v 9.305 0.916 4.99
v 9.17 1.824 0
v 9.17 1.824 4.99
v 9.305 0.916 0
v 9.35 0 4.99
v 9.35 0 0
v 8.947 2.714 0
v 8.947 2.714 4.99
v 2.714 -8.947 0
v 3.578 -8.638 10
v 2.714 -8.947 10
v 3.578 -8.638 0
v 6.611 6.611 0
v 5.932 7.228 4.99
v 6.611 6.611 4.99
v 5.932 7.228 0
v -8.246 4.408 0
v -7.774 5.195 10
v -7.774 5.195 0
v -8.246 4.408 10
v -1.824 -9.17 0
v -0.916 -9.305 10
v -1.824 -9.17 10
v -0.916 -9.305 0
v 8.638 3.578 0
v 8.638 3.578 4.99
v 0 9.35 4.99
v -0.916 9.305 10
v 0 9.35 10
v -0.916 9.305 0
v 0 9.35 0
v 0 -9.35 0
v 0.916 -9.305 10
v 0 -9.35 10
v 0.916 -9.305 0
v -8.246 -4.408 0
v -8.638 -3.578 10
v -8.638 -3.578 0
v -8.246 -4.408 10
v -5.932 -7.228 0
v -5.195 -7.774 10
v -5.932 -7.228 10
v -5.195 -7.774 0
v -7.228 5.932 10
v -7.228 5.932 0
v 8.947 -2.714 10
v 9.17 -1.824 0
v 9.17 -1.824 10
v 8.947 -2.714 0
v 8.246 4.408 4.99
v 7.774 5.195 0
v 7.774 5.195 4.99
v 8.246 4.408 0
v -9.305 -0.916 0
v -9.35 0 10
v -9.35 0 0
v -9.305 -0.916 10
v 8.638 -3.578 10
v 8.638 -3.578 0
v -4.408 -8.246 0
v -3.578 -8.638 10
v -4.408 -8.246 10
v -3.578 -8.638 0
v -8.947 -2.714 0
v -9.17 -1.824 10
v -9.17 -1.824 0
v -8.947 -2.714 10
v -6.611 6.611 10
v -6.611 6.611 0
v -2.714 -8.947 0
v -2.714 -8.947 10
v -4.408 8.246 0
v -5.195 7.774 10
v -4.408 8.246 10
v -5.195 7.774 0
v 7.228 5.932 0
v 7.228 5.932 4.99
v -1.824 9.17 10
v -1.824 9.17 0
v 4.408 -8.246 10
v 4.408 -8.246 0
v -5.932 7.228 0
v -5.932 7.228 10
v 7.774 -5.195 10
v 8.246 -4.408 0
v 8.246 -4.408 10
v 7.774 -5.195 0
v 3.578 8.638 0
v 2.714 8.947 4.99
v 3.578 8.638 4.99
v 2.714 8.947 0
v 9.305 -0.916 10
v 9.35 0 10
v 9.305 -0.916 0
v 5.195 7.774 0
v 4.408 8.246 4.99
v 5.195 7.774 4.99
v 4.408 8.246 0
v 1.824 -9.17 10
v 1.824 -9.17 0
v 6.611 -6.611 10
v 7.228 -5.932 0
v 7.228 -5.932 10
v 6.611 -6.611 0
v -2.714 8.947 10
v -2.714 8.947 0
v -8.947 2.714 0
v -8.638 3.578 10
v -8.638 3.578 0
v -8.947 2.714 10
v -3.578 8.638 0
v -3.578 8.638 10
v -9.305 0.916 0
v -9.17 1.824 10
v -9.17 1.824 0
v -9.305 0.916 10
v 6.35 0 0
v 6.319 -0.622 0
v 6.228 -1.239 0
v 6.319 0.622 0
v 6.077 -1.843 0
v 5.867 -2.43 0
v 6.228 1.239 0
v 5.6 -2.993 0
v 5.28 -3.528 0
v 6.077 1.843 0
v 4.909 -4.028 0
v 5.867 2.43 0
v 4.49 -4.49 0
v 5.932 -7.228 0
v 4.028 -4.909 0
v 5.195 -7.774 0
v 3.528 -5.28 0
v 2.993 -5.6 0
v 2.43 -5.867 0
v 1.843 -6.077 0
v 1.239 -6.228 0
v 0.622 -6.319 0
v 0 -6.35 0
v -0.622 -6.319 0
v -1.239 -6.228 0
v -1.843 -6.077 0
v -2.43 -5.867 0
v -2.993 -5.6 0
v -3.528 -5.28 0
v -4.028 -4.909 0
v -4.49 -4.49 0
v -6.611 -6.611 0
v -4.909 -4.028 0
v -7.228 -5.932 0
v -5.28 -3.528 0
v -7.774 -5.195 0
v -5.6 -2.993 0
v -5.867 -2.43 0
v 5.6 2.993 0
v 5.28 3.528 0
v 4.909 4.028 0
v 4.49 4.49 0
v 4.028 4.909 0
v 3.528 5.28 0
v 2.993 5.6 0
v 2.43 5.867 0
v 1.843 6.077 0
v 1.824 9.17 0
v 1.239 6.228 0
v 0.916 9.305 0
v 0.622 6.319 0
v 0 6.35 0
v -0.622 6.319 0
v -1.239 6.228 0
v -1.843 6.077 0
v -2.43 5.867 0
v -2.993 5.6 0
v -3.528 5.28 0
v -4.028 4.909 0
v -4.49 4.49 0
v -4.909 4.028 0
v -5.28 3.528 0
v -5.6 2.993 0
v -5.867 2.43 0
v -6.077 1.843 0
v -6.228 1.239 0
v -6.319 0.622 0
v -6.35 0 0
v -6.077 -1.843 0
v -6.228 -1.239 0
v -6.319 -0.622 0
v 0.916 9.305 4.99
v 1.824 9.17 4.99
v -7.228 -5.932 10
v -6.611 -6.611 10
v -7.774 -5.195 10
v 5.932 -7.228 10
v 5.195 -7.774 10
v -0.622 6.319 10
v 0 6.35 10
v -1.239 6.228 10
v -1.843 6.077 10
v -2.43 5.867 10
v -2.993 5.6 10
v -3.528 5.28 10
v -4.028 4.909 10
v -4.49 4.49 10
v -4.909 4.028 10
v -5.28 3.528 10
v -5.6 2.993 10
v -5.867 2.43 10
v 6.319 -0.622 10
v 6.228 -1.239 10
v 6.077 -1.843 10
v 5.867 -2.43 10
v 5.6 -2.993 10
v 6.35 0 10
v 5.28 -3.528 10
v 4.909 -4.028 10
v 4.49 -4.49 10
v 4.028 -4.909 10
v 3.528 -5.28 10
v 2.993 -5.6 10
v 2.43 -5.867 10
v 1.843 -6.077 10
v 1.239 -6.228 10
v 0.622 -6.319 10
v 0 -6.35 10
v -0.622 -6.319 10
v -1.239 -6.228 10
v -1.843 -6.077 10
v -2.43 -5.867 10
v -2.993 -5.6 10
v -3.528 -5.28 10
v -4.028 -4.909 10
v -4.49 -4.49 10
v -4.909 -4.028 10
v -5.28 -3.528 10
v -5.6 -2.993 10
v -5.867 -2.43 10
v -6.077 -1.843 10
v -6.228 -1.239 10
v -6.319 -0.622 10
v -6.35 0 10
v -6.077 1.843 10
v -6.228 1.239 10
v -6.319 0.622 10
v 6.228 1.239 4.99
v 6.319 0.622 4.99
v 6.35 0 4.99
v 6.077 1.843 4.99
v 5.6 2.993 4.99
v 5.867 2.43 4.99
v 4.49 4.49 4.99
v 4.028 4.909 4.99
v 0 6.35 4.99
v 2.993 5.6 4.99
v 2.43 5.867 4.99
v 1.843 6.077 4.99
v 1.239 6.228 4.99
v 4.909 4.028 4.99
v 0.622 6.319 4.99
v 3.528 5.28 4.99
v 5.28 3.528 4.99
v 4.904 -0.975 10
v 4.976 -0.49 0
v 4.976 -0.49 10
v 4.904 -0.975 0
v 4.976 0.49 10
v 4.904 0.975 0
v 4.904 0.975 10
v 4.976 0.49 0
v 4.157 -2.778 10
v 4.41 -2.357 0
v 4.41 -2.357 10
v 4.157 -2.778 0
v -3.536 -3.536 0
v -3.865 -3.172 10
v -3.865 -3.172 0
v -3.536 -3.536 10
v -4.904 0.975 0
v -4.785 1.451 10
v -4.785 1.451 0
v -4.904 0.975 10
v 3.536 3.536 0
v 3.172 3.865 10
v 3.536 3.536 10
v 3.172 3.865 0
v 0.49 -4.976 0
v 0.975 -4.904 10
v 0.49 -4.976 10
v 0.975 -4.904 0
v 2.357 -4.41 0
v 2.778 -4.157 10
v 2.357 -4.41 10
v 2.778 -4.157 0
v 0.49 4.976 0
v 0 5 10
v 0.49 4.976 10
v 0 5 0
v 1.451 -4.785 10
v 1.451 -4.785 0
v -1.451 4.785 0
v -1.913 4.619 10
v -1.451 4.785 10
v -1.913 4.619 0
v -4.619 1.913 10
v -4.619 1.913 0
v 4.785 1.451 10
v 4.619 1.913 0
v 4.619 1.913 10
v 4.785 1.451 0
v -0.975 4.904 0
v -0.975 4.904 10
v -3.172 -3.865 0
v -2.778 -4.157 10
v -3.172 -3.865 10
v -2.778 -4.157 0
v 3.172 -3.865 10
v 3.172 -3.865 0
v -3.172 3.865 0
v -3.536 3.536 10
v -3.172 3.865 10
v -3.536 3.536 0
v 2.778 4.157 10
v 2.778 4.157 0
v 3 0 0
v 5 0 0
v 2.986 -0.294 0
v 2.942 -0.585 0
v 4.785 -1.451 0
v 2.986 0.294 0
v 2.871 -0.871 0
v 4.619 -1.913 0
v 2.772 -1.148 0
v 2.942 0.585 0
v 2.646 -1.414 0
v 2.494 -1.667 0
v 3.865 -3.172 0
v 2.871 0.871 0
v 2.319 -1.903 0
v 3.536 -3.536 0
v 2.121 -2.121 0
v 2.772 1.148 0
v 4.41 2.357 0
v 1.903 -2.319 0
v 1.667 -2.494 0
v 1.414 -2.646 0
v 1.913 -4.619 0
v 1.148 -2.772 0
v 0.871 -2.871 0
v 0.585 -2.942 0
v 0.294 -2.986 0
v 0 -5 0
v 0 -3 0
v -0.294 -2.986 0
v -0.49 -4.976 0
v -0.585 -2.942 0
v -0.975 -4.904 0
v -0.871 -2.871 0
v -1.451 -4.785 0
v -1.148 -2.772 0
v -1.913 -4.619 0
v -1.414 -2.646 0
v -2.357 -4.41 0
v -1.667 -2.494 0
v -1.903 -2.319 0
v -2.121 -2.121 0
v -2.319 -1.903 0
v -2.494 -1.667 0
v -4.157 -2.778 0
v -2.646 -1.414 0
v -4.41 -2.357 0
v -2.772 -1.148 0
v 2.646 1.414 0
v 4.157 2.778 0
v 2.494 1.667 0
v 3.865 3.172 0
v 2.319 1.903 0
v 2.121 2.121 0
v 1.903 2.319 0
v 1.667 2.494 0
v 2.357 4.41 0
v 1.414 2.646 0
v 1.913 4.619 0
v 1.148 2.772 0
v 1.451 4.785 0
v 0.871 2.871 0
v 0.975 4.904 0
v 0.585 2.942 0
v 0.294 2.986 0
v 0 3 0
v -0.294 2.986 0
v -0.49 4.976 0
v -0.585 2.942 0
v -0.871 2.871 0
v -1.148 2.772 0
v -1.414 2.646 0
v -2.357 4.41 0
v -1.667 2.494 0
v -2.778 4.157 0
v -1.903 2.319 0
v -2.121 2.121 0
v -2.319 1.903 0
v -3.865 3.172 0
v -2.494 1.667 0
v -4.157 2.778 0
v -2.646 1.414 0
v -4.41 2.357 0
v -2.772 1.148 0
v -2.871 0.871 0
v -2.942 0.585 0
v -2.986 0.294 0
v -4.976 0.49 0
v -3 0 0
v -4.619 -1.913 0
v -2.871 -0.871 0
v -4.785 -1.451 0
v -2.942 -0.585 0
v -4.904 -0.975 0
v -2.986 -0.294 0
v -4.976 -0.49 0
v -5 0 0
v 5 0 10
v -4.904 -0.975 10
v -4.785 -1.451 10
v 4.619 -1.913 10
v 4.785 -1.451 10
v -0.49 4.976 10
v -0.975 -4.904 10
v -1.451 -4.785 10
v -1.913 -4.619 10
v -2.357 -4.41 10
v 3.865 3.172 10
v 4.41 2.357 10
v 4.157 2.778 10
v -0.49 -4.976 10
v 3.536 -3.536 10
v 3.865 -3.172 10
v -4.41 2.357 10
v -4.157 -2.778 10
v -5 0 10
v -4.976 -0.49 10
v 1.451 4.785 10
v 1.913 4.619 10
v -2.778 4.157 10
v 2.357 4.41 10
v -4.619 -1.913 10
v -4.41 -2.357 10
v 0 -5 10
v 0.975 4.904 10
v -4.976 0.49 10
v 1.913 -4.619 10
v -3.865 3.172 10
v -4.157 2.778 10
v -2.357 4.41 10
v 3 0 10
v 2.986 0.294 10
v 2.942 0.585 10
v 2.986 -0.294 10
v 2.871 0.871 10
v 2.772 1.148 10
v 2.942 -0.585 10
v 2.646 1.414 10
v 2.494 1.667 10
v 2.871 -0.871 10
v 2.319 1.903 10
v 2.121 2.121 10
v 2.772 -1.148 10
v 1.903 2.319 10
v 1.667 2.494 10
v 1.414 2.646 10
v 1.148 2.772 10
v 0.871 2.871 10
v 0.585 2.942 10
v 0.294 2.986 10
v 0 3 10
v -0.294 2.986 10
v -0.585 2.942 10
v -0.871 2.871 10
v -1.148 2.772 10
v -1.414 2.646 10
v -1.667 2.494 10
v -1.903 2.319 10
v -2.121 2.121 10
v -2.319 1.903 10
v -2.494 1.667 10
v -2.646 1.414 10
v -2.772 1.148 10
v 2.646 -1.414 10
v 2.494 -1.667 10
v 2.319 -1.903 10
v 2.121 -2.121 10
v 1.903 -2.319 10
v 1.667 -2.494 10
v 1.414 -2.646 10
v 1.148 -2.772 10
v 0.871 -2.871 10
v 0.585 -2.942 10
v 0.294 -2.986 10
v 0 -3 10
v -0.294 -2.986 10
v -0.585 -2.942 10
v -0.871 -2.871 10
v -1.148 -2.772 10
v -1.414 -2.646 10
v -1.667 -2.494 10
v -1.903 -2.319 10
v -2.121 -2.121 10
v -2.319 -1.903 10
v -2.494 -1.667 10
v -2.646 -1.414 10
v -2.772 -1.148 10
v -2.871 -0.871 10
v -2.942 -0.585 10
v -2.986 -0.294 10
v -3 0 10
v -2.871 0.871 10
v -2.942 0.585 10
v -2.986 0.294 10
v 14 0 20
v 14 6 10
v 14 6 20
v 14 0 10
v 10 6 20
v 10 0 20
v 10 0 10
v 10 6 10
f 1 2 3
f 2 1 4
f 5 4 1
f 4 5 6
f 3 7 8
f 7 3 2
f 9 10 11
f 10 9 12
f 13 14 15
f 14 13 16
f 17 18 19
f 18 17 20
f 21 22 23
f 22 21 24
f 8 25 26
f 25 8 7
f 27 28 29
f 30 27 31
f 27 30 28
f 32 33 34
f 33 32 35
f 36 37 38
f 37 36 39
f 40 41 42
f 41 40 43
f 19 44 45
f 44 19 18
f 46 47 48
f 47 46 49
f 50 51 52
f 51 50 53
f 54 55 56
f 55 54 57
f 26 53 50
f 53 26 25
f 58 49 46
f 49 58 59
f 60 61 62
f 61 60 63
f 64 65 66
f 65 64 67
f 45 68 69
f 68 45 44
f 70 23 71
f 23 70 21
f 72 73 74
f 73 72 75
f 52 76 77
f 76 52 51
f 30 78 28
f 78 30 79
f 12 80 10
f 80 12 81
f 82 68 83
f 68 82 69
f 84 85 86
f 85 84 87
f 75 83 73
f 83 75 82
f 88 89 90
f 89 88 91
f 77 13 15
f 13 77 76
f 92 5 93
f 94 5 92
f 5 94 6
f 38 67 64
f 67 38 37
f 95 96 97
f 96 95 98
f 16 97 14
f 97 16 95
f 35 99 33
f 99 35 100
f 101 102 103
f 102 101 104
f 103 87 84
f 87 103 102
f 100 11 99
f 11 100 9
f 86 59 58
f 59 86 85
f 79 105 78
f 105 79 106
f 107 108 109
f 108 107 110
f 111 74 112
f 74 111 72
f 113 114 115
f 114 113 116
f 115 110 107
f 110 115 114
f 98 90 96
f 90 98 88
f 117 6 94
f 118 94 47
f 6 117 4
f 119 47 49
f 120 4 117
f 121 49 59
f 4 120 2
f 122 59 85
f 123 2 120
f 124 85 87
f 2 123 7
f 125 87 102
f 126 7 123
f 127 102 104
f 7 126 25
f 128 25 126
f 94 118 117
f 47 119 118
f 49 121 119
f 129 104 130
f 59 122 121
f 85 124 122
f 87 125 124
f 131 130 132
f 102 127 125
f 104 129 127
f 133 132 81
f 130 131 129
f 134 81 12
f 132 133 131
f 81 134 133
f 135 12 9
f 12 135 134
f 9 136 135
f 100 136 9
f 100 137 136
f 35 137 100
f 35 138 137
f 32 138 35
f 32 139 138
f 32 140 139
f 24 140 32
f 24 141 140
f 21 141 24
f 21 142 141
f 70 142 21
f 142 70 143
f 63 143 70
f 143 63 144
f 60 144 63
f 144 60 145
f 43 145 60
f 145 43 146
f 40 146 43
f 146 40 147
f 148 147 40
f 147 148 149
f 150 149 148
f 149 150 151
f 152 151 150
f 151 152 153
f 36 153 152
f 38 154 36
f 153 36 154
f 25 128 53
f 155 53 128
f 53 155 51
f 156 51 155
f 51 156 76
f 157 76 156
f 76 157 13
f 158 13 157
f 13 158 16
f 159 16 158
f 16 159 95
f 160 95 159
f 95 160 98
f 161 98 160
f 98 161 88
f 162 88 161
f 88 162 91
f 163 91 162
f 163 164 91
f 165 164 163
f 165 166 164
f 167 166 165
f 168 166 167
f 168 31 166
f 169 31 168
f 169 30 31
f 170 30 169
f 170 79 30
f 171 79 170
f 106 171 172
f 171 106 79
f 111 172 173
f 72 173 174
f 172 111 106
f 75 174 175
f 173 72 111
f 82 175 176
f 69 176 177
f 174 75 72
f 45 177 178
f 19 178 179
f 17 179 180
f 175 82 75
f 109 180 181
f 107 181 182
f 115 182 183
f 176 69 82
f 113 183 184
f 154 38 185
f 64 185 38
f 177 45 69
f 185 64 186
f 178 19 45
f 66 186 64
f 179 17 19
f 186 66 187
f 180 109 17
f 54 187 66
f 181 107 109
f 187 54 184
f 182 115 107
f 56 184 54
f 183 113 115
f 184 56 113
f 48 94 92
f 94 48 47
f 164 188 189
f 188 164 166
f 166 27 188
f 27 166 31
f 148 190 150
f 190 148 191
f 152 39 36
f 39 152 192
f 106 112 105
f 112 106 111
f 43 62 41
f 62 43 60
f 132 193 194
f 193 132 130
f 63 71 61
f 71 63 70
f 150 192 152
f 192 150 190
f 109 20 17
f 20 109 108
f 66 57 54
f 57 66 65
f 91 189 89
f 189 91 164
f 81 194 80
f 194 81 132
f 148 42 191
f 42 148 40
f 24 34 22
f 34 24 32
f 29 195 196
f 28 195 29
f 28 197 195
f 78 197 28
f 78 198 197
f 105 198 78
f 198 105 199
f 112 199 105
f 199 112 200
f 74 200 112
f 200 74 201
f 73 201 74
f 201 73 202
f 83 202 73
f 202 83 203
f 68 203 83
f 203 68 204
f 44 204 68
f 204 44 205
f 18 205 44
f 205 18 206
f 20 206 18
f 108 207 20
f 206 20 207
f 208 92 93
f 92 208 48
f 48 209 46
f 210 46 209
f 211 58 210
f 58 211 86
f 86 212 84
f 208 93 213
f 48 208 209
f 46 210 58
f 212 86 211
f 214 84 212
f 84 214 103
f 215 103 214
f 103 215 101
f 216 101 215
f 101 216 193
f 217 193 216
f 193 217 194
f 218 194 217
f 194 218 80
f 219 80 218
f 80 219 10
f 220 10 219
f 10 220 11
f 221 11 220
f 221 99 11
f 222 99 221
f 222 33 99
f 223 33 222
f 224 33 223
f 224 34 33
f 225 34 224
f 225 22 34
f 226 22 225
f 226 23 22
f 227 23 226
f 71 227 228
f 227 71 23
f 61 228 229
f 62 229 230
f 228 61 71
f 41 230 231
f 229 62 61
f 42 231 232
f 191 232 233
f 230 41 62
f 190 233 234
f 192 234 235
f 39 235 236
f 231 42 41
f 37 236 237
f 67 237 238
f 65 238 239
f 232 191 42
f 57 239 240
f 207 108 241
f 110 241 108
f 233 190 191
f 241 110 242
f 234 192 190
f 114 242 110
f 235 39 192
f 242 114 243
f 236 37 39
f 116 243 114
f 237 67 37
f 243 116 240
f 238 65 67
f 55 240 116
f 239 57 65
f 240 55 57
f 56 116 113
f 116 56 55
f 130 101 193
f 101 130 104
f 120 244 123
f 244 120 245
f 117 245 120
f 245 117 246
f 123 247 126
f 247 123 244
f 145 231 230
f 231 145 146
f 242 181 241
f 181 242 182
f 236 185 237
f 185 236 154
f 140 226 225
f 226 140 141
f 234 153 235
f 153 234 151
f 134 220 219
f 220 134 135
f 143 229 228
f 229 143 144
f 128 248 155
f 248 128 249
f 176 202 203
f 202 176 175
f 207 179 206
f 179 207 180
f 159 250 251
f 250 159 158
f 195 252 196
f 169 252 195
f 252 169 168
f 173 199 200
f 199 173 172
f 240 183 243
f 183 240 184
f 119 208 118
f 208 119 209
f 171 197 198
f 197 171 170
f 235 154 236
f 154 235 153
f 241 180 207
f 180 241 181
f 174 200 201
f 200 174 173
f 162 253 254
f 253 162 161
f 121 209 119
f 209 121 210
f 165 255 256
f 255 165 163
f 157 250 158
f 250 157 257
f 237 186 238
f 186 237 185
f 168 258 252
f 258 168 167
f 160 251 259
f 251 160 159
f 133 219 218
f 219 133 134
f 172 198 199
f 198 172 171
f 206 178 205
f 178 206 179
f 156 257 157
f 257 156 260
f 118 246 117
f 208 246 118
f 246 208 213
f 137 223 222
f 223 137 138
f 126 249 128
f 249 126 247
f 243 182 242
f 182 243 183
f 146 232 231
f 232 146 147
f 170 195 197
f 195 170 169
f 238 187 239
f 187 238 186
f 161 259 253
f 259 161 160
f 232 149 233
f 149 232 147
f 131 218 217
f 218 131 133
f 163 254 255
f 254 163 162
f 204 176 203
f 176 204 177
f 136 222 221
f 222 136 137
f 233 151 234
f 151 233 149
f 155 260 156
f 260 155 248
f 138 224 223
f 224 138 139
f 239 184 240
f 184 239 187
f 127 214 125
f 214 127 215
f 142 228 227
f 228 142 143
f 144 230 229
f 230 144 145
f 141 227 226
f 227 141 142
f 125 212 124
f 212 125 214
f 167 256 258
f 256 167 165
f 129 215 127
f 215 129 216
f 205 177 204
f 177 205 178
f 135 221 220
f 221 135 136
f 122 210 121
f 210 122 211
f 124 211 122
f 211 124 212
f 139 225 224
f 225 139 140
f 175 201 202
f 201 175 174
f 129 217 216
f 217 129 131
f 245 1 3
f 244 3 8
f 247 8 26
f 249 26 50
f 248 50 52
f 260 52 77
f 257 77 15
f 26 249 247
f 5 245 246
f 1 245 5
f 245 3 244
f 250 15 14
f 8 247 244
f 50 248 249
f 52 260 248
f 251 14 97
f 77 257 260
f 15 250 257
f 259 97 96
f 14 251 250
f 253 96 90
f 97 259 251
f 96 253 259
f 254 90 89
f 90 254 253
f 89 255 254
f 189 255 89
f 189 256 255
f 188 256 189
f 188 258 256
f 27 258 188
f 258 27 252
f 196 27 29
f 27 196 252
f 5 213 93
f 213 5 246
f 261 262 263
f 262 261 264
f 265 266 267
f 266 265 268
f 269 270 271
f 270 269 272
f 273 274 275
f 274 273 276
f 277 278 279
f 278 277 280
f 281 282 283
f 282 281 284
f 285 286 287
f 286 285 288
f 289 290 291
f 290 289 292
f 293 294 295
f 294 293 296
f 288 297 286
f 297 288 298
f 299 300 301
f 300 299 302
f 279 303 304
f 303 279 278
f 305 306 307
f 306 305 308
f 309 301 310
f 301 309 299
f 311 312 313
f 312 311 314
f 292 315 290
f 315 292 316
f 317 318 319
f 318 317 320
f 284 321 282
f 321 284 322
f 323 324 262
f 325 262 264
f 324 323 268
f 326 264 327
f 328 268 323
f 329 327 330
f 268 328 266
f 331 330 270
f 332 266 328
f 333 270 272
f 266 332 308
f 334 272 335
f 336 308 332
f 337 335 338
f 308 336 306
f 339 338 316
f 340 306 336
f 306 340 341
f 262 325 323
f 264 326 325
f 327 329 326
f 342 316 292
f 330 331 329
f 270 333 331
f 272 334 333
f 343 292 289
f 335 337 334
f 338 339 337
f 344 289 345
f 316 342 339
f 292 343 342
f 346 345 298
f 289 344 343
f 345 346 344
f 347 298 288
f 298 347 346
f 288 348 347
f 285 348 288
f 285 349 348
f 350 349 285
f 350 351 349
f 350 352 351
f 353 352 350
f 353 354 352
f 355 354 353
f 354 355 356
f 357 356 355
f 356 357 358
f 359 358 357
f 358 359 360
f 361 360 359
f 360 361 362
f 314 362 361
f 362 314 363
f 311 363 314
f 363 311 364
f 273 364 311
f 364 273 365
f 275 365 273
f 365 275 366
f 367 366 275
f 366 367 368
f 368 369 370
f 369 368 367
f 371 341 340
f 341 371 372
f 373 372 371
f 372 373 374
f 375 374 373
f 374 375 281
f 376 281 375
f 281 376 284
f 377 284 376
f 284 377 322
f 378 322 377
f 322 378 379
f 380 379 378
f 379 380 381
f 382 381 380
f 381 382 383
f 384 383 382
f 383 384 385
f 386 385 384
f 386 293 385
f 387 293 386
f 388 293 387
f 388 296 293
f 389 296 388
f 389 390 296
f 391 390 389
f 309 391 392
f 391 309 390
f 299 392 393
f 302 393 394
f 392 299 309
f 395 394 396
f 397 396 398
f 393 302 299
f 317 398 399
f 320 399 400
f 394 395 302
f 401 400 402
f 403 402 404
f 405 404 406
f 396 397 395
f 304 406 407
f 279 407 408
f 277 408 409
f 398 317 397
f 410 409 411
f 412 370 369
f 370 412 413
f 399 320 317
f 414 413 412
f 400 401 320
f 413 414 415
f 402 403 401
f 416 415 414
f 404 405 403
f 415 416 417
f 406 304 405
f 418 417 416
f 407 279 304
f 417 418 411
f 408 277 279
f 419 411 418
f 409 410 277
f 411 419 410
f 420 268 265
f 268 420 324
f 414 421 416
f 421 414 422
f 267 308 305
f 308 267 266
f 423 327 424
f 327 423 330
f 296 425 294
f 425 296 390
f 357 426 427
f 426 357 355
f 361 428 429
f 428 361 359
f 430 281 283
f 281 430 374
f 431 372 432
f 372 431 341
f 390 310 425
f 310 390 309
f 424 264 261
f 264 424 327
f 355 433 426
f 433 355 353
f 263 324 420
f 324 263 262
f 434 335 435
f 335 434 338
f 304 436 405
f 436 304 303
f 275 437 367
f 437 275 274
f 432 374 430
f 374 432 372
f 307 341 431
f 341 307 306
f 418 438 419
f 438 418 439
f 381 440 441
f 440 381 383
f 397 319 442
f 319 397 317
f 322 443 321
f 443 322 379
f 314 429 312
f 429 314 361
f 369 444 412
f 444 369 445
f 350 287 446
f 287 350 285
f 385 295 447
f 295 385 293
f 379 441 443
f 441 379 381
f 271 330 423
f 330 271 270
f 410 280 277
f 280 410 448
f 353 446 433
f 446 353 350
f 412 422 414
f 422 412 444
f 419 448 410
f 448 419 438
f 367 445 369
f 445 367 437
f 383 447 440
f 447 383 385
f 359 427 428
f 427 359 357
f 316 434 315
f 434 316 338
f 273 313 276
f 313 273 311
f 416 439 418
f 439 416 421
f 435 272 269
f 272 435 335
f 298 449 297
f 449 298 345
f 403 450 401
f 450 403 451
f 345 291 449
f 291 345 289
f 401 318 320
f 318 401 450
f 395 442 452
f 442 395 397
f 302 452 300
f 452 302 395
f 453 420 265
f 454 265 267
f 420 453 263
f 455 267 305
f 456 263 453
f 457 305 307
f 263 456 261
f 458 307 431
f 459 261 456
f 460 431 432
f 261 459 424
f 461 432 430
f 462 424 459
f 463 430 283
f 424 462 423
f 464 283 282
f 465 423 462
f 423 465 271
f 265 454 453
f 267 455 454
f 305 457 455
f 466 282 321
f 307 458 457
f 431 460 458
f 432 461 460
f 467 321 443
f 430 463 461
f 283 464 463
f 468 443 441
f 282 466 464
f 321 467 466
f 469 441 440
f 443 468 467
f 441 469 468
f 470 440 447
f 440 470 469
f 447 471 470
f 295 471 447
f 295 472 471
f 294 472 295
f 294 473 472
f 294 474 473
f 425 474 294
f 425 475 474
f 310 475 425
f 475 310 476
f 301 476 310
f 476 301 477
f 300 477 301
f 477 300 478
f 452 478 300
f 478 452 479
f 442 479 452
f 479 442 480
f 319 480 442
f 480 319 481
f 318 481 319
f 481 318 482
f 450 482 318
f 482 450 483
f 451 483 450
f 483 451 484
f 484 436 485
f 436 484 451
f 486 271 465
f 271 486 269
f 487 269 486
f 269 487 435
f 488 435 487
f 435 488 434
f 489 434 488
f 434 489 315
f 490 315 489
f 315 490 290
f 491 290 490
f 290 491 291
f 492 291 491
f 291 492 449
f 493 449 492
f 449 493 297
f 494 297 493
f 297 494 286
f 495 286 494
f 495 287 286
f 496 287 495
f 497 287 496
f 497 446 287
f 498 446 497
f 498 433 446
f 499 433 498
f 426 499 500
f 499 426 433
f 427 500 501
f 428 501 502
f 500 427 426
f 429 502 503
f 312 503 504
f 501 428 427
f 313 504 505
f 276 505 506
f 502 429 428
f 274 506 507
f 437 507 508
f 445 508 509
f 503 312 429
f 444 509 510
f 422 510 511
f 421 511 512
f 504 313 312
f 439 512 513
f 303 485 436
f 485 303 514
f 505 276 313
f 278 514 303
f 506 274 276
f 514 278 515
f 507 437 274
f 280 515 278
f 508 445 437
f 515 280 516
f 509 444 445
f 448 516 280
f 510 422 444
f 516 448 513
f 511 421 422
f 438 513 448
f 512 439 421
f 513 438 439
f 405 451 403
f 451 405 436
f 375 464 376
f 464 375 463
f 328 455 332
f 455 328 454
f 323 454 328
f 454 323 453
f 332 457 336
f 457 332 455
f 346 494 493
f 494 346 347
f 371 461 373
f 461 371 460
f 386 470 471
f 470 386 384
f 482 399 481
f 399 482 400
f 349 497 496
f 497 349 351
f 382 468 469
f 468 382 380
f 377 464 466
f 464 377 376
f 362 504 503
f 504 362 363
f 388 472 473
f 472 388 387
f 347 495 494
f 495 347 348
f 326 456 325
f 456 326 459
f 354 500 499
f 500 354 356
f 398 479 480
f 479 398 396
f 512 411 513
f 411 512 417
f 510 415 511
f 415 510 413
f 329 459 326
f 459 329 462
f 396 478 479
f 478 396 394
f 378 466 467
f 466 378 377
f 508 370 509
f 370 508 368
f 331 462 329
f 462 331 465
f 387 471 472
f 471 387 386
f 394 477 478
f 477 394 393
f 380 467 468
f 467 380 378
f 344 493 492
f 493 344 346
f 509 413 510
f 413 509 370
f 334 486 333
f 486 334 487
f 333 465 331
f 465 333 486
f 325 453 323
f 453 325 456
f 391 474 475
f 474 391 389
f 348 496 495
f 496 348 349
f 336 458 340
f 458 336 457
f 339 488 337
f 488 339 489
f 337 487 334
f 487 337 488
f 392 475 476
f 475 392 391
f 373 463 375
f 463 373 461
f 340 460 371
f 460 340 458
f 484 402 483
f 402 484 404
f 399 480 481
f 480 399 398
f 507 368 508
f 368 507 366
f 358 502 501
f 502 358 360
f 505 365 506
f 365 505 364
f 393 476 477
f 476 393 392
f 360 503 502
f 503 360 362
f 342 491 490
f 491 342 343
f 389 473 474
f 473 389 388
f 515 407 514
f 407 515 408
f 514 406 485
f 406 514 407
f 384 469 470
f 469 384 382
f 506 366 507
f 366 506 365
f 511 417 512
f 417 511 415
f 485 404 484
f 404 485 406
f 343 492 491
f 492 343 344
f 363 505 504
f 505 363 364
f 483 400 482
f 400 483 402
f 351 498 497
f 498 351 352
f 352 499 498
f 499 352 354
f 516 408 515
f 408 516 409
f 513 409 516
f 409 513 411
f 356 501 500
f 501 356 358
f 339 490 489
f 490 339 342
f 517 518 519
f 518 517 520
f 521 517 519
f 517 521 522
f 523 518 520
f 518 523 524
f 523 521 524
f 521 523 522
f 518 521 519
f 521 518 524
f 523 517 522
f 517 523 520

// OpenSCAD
$fn = 64;

// Dimensions
rod_diameter = 12.7;           // Inner diameter of rod ring
rod_wall = 3;                 // Wall thickness of rod ring
rod_outer_diameter = rod_diameter + 2 * rod_wall;  // 18.7 mm

tubing_inner_diameter = 6;      // Inner diameter of tubing ring
tubing_wall = 2;                // Wall thickness of tubing ring
tubing_outer_diameter = tubing_inner_diameter + 2 * tubing_wall;  // 10 mm

bridge_width_y = 6;           // Width of bridge in Y direction
bridge_start_x = 8;         // Start X of bridge
bridge_end_x = 12;          // End X of bridge

// Rod ring: centered at origin, with -X side opening
rod_ring_inner_radius = rod_diameter / 2;
rod_ring_outer_radius = rod_outer_diameter / 2;

// Tubing ring: centered at (15, 0), with +X side opening
tubing_ring_center_x = 15;
tubing_ring_center_y = 0;
tubing_ring_inner_radius = tubing_inner_diameter / 2;
tubing_ring_outer_radius = tubing_outer_diameter / 2;

// Opening dimensions
rod_opening_width = 10;     // Width of opening in rod ring (-X side)
rod_opening_half_y = rod_opening_width / 2;  // -5 to +5

tubing_opening_width = 4.5;    // Width of opening in tubing ring (+X side)
tubing_opening_half_y = tubing_opening_width / 2;  // -2.25 to +2.25

// Bridge: solid connection between rings, 6 mm wide in Y, from x=8 to x=12
bridge_y_min = -bridge_width_y / 2;
bridge_y_max = bridge_width_y / 2;

// Ensure the part is printed flat on the bed at z = 0
// The original model was offset with z = -5.00, so we need to shift it up by 5 mm
// The total height is 10 mm, so we want the bottom at z = 0

// Build the clip with correct vertical positioning
module clip() {
    // Rod ring with -X side opening
    difference() {
        // Outer ring (full circle)
        cylinder(h = 10, r = rod_ring_outer_radius, center = true);
        // Inner hole (full circle)
        cylinder(h = 10, r = rod_ring_inner_radius, center = true);
        // Cut out the opening: a rectangle from x = -rod_ring_outer_radius to x = 0, y = -5 to 5
        // Use a slightly larger rectangle to ensure full removal (0.01 mm past face)
        translate([0, 0, -0.01])
        cube([rod_ring_outer_radius * 2 + 0.02, rod_opening_width + 0.02, 10.02], center = false);
    }

    // Tubing ring with +X side opening
    difference() {
        // Outer ring (full circle)
        cylinder(h = 10, r = tubing_ring_outer_radius, center = true);
        // Inner hole (full circle)
        cylinder(h = 10, r = tubing_ring_inner_radius, center = true);
        // Cut out the opening: a rectangle from x = 15 to x = 15 + tubing_ring_outer_radius, y = -2.25 to 2.25
        // Use a slightly larger rectangle to ensure full removal
        translate([tubing_ring_center_x, 0, -0.01])
        cube([tubing_ring_outer_radius * 2 + 0.02, tubing_opening_width + 0.02, 10.02], center = false);
    }

    // Bridge: solid rectangle connecting the two rings
    // From x = 8 to 12, y = -3 to 3 (6 mm wide), z = 0 to 10
    // Centered at (10, 0, 5) for proper height
    translate([bridge_start_x + (bridge_end_x - bridge_start_x)/2, 0, 5])
    cube([bridge_end_x - bridge_start_x, bridge_width_y, 10], center = false);
}

// Assemble the entire clip, shifted so that z = 0 is the bottom
// The original model was centered at z = 0 with height 10 mm, so it extended from -5 to +5
// We need to shift it up by 5 mm so that the bottom is at z = 0
translate([0, 0, 5])
clip();
